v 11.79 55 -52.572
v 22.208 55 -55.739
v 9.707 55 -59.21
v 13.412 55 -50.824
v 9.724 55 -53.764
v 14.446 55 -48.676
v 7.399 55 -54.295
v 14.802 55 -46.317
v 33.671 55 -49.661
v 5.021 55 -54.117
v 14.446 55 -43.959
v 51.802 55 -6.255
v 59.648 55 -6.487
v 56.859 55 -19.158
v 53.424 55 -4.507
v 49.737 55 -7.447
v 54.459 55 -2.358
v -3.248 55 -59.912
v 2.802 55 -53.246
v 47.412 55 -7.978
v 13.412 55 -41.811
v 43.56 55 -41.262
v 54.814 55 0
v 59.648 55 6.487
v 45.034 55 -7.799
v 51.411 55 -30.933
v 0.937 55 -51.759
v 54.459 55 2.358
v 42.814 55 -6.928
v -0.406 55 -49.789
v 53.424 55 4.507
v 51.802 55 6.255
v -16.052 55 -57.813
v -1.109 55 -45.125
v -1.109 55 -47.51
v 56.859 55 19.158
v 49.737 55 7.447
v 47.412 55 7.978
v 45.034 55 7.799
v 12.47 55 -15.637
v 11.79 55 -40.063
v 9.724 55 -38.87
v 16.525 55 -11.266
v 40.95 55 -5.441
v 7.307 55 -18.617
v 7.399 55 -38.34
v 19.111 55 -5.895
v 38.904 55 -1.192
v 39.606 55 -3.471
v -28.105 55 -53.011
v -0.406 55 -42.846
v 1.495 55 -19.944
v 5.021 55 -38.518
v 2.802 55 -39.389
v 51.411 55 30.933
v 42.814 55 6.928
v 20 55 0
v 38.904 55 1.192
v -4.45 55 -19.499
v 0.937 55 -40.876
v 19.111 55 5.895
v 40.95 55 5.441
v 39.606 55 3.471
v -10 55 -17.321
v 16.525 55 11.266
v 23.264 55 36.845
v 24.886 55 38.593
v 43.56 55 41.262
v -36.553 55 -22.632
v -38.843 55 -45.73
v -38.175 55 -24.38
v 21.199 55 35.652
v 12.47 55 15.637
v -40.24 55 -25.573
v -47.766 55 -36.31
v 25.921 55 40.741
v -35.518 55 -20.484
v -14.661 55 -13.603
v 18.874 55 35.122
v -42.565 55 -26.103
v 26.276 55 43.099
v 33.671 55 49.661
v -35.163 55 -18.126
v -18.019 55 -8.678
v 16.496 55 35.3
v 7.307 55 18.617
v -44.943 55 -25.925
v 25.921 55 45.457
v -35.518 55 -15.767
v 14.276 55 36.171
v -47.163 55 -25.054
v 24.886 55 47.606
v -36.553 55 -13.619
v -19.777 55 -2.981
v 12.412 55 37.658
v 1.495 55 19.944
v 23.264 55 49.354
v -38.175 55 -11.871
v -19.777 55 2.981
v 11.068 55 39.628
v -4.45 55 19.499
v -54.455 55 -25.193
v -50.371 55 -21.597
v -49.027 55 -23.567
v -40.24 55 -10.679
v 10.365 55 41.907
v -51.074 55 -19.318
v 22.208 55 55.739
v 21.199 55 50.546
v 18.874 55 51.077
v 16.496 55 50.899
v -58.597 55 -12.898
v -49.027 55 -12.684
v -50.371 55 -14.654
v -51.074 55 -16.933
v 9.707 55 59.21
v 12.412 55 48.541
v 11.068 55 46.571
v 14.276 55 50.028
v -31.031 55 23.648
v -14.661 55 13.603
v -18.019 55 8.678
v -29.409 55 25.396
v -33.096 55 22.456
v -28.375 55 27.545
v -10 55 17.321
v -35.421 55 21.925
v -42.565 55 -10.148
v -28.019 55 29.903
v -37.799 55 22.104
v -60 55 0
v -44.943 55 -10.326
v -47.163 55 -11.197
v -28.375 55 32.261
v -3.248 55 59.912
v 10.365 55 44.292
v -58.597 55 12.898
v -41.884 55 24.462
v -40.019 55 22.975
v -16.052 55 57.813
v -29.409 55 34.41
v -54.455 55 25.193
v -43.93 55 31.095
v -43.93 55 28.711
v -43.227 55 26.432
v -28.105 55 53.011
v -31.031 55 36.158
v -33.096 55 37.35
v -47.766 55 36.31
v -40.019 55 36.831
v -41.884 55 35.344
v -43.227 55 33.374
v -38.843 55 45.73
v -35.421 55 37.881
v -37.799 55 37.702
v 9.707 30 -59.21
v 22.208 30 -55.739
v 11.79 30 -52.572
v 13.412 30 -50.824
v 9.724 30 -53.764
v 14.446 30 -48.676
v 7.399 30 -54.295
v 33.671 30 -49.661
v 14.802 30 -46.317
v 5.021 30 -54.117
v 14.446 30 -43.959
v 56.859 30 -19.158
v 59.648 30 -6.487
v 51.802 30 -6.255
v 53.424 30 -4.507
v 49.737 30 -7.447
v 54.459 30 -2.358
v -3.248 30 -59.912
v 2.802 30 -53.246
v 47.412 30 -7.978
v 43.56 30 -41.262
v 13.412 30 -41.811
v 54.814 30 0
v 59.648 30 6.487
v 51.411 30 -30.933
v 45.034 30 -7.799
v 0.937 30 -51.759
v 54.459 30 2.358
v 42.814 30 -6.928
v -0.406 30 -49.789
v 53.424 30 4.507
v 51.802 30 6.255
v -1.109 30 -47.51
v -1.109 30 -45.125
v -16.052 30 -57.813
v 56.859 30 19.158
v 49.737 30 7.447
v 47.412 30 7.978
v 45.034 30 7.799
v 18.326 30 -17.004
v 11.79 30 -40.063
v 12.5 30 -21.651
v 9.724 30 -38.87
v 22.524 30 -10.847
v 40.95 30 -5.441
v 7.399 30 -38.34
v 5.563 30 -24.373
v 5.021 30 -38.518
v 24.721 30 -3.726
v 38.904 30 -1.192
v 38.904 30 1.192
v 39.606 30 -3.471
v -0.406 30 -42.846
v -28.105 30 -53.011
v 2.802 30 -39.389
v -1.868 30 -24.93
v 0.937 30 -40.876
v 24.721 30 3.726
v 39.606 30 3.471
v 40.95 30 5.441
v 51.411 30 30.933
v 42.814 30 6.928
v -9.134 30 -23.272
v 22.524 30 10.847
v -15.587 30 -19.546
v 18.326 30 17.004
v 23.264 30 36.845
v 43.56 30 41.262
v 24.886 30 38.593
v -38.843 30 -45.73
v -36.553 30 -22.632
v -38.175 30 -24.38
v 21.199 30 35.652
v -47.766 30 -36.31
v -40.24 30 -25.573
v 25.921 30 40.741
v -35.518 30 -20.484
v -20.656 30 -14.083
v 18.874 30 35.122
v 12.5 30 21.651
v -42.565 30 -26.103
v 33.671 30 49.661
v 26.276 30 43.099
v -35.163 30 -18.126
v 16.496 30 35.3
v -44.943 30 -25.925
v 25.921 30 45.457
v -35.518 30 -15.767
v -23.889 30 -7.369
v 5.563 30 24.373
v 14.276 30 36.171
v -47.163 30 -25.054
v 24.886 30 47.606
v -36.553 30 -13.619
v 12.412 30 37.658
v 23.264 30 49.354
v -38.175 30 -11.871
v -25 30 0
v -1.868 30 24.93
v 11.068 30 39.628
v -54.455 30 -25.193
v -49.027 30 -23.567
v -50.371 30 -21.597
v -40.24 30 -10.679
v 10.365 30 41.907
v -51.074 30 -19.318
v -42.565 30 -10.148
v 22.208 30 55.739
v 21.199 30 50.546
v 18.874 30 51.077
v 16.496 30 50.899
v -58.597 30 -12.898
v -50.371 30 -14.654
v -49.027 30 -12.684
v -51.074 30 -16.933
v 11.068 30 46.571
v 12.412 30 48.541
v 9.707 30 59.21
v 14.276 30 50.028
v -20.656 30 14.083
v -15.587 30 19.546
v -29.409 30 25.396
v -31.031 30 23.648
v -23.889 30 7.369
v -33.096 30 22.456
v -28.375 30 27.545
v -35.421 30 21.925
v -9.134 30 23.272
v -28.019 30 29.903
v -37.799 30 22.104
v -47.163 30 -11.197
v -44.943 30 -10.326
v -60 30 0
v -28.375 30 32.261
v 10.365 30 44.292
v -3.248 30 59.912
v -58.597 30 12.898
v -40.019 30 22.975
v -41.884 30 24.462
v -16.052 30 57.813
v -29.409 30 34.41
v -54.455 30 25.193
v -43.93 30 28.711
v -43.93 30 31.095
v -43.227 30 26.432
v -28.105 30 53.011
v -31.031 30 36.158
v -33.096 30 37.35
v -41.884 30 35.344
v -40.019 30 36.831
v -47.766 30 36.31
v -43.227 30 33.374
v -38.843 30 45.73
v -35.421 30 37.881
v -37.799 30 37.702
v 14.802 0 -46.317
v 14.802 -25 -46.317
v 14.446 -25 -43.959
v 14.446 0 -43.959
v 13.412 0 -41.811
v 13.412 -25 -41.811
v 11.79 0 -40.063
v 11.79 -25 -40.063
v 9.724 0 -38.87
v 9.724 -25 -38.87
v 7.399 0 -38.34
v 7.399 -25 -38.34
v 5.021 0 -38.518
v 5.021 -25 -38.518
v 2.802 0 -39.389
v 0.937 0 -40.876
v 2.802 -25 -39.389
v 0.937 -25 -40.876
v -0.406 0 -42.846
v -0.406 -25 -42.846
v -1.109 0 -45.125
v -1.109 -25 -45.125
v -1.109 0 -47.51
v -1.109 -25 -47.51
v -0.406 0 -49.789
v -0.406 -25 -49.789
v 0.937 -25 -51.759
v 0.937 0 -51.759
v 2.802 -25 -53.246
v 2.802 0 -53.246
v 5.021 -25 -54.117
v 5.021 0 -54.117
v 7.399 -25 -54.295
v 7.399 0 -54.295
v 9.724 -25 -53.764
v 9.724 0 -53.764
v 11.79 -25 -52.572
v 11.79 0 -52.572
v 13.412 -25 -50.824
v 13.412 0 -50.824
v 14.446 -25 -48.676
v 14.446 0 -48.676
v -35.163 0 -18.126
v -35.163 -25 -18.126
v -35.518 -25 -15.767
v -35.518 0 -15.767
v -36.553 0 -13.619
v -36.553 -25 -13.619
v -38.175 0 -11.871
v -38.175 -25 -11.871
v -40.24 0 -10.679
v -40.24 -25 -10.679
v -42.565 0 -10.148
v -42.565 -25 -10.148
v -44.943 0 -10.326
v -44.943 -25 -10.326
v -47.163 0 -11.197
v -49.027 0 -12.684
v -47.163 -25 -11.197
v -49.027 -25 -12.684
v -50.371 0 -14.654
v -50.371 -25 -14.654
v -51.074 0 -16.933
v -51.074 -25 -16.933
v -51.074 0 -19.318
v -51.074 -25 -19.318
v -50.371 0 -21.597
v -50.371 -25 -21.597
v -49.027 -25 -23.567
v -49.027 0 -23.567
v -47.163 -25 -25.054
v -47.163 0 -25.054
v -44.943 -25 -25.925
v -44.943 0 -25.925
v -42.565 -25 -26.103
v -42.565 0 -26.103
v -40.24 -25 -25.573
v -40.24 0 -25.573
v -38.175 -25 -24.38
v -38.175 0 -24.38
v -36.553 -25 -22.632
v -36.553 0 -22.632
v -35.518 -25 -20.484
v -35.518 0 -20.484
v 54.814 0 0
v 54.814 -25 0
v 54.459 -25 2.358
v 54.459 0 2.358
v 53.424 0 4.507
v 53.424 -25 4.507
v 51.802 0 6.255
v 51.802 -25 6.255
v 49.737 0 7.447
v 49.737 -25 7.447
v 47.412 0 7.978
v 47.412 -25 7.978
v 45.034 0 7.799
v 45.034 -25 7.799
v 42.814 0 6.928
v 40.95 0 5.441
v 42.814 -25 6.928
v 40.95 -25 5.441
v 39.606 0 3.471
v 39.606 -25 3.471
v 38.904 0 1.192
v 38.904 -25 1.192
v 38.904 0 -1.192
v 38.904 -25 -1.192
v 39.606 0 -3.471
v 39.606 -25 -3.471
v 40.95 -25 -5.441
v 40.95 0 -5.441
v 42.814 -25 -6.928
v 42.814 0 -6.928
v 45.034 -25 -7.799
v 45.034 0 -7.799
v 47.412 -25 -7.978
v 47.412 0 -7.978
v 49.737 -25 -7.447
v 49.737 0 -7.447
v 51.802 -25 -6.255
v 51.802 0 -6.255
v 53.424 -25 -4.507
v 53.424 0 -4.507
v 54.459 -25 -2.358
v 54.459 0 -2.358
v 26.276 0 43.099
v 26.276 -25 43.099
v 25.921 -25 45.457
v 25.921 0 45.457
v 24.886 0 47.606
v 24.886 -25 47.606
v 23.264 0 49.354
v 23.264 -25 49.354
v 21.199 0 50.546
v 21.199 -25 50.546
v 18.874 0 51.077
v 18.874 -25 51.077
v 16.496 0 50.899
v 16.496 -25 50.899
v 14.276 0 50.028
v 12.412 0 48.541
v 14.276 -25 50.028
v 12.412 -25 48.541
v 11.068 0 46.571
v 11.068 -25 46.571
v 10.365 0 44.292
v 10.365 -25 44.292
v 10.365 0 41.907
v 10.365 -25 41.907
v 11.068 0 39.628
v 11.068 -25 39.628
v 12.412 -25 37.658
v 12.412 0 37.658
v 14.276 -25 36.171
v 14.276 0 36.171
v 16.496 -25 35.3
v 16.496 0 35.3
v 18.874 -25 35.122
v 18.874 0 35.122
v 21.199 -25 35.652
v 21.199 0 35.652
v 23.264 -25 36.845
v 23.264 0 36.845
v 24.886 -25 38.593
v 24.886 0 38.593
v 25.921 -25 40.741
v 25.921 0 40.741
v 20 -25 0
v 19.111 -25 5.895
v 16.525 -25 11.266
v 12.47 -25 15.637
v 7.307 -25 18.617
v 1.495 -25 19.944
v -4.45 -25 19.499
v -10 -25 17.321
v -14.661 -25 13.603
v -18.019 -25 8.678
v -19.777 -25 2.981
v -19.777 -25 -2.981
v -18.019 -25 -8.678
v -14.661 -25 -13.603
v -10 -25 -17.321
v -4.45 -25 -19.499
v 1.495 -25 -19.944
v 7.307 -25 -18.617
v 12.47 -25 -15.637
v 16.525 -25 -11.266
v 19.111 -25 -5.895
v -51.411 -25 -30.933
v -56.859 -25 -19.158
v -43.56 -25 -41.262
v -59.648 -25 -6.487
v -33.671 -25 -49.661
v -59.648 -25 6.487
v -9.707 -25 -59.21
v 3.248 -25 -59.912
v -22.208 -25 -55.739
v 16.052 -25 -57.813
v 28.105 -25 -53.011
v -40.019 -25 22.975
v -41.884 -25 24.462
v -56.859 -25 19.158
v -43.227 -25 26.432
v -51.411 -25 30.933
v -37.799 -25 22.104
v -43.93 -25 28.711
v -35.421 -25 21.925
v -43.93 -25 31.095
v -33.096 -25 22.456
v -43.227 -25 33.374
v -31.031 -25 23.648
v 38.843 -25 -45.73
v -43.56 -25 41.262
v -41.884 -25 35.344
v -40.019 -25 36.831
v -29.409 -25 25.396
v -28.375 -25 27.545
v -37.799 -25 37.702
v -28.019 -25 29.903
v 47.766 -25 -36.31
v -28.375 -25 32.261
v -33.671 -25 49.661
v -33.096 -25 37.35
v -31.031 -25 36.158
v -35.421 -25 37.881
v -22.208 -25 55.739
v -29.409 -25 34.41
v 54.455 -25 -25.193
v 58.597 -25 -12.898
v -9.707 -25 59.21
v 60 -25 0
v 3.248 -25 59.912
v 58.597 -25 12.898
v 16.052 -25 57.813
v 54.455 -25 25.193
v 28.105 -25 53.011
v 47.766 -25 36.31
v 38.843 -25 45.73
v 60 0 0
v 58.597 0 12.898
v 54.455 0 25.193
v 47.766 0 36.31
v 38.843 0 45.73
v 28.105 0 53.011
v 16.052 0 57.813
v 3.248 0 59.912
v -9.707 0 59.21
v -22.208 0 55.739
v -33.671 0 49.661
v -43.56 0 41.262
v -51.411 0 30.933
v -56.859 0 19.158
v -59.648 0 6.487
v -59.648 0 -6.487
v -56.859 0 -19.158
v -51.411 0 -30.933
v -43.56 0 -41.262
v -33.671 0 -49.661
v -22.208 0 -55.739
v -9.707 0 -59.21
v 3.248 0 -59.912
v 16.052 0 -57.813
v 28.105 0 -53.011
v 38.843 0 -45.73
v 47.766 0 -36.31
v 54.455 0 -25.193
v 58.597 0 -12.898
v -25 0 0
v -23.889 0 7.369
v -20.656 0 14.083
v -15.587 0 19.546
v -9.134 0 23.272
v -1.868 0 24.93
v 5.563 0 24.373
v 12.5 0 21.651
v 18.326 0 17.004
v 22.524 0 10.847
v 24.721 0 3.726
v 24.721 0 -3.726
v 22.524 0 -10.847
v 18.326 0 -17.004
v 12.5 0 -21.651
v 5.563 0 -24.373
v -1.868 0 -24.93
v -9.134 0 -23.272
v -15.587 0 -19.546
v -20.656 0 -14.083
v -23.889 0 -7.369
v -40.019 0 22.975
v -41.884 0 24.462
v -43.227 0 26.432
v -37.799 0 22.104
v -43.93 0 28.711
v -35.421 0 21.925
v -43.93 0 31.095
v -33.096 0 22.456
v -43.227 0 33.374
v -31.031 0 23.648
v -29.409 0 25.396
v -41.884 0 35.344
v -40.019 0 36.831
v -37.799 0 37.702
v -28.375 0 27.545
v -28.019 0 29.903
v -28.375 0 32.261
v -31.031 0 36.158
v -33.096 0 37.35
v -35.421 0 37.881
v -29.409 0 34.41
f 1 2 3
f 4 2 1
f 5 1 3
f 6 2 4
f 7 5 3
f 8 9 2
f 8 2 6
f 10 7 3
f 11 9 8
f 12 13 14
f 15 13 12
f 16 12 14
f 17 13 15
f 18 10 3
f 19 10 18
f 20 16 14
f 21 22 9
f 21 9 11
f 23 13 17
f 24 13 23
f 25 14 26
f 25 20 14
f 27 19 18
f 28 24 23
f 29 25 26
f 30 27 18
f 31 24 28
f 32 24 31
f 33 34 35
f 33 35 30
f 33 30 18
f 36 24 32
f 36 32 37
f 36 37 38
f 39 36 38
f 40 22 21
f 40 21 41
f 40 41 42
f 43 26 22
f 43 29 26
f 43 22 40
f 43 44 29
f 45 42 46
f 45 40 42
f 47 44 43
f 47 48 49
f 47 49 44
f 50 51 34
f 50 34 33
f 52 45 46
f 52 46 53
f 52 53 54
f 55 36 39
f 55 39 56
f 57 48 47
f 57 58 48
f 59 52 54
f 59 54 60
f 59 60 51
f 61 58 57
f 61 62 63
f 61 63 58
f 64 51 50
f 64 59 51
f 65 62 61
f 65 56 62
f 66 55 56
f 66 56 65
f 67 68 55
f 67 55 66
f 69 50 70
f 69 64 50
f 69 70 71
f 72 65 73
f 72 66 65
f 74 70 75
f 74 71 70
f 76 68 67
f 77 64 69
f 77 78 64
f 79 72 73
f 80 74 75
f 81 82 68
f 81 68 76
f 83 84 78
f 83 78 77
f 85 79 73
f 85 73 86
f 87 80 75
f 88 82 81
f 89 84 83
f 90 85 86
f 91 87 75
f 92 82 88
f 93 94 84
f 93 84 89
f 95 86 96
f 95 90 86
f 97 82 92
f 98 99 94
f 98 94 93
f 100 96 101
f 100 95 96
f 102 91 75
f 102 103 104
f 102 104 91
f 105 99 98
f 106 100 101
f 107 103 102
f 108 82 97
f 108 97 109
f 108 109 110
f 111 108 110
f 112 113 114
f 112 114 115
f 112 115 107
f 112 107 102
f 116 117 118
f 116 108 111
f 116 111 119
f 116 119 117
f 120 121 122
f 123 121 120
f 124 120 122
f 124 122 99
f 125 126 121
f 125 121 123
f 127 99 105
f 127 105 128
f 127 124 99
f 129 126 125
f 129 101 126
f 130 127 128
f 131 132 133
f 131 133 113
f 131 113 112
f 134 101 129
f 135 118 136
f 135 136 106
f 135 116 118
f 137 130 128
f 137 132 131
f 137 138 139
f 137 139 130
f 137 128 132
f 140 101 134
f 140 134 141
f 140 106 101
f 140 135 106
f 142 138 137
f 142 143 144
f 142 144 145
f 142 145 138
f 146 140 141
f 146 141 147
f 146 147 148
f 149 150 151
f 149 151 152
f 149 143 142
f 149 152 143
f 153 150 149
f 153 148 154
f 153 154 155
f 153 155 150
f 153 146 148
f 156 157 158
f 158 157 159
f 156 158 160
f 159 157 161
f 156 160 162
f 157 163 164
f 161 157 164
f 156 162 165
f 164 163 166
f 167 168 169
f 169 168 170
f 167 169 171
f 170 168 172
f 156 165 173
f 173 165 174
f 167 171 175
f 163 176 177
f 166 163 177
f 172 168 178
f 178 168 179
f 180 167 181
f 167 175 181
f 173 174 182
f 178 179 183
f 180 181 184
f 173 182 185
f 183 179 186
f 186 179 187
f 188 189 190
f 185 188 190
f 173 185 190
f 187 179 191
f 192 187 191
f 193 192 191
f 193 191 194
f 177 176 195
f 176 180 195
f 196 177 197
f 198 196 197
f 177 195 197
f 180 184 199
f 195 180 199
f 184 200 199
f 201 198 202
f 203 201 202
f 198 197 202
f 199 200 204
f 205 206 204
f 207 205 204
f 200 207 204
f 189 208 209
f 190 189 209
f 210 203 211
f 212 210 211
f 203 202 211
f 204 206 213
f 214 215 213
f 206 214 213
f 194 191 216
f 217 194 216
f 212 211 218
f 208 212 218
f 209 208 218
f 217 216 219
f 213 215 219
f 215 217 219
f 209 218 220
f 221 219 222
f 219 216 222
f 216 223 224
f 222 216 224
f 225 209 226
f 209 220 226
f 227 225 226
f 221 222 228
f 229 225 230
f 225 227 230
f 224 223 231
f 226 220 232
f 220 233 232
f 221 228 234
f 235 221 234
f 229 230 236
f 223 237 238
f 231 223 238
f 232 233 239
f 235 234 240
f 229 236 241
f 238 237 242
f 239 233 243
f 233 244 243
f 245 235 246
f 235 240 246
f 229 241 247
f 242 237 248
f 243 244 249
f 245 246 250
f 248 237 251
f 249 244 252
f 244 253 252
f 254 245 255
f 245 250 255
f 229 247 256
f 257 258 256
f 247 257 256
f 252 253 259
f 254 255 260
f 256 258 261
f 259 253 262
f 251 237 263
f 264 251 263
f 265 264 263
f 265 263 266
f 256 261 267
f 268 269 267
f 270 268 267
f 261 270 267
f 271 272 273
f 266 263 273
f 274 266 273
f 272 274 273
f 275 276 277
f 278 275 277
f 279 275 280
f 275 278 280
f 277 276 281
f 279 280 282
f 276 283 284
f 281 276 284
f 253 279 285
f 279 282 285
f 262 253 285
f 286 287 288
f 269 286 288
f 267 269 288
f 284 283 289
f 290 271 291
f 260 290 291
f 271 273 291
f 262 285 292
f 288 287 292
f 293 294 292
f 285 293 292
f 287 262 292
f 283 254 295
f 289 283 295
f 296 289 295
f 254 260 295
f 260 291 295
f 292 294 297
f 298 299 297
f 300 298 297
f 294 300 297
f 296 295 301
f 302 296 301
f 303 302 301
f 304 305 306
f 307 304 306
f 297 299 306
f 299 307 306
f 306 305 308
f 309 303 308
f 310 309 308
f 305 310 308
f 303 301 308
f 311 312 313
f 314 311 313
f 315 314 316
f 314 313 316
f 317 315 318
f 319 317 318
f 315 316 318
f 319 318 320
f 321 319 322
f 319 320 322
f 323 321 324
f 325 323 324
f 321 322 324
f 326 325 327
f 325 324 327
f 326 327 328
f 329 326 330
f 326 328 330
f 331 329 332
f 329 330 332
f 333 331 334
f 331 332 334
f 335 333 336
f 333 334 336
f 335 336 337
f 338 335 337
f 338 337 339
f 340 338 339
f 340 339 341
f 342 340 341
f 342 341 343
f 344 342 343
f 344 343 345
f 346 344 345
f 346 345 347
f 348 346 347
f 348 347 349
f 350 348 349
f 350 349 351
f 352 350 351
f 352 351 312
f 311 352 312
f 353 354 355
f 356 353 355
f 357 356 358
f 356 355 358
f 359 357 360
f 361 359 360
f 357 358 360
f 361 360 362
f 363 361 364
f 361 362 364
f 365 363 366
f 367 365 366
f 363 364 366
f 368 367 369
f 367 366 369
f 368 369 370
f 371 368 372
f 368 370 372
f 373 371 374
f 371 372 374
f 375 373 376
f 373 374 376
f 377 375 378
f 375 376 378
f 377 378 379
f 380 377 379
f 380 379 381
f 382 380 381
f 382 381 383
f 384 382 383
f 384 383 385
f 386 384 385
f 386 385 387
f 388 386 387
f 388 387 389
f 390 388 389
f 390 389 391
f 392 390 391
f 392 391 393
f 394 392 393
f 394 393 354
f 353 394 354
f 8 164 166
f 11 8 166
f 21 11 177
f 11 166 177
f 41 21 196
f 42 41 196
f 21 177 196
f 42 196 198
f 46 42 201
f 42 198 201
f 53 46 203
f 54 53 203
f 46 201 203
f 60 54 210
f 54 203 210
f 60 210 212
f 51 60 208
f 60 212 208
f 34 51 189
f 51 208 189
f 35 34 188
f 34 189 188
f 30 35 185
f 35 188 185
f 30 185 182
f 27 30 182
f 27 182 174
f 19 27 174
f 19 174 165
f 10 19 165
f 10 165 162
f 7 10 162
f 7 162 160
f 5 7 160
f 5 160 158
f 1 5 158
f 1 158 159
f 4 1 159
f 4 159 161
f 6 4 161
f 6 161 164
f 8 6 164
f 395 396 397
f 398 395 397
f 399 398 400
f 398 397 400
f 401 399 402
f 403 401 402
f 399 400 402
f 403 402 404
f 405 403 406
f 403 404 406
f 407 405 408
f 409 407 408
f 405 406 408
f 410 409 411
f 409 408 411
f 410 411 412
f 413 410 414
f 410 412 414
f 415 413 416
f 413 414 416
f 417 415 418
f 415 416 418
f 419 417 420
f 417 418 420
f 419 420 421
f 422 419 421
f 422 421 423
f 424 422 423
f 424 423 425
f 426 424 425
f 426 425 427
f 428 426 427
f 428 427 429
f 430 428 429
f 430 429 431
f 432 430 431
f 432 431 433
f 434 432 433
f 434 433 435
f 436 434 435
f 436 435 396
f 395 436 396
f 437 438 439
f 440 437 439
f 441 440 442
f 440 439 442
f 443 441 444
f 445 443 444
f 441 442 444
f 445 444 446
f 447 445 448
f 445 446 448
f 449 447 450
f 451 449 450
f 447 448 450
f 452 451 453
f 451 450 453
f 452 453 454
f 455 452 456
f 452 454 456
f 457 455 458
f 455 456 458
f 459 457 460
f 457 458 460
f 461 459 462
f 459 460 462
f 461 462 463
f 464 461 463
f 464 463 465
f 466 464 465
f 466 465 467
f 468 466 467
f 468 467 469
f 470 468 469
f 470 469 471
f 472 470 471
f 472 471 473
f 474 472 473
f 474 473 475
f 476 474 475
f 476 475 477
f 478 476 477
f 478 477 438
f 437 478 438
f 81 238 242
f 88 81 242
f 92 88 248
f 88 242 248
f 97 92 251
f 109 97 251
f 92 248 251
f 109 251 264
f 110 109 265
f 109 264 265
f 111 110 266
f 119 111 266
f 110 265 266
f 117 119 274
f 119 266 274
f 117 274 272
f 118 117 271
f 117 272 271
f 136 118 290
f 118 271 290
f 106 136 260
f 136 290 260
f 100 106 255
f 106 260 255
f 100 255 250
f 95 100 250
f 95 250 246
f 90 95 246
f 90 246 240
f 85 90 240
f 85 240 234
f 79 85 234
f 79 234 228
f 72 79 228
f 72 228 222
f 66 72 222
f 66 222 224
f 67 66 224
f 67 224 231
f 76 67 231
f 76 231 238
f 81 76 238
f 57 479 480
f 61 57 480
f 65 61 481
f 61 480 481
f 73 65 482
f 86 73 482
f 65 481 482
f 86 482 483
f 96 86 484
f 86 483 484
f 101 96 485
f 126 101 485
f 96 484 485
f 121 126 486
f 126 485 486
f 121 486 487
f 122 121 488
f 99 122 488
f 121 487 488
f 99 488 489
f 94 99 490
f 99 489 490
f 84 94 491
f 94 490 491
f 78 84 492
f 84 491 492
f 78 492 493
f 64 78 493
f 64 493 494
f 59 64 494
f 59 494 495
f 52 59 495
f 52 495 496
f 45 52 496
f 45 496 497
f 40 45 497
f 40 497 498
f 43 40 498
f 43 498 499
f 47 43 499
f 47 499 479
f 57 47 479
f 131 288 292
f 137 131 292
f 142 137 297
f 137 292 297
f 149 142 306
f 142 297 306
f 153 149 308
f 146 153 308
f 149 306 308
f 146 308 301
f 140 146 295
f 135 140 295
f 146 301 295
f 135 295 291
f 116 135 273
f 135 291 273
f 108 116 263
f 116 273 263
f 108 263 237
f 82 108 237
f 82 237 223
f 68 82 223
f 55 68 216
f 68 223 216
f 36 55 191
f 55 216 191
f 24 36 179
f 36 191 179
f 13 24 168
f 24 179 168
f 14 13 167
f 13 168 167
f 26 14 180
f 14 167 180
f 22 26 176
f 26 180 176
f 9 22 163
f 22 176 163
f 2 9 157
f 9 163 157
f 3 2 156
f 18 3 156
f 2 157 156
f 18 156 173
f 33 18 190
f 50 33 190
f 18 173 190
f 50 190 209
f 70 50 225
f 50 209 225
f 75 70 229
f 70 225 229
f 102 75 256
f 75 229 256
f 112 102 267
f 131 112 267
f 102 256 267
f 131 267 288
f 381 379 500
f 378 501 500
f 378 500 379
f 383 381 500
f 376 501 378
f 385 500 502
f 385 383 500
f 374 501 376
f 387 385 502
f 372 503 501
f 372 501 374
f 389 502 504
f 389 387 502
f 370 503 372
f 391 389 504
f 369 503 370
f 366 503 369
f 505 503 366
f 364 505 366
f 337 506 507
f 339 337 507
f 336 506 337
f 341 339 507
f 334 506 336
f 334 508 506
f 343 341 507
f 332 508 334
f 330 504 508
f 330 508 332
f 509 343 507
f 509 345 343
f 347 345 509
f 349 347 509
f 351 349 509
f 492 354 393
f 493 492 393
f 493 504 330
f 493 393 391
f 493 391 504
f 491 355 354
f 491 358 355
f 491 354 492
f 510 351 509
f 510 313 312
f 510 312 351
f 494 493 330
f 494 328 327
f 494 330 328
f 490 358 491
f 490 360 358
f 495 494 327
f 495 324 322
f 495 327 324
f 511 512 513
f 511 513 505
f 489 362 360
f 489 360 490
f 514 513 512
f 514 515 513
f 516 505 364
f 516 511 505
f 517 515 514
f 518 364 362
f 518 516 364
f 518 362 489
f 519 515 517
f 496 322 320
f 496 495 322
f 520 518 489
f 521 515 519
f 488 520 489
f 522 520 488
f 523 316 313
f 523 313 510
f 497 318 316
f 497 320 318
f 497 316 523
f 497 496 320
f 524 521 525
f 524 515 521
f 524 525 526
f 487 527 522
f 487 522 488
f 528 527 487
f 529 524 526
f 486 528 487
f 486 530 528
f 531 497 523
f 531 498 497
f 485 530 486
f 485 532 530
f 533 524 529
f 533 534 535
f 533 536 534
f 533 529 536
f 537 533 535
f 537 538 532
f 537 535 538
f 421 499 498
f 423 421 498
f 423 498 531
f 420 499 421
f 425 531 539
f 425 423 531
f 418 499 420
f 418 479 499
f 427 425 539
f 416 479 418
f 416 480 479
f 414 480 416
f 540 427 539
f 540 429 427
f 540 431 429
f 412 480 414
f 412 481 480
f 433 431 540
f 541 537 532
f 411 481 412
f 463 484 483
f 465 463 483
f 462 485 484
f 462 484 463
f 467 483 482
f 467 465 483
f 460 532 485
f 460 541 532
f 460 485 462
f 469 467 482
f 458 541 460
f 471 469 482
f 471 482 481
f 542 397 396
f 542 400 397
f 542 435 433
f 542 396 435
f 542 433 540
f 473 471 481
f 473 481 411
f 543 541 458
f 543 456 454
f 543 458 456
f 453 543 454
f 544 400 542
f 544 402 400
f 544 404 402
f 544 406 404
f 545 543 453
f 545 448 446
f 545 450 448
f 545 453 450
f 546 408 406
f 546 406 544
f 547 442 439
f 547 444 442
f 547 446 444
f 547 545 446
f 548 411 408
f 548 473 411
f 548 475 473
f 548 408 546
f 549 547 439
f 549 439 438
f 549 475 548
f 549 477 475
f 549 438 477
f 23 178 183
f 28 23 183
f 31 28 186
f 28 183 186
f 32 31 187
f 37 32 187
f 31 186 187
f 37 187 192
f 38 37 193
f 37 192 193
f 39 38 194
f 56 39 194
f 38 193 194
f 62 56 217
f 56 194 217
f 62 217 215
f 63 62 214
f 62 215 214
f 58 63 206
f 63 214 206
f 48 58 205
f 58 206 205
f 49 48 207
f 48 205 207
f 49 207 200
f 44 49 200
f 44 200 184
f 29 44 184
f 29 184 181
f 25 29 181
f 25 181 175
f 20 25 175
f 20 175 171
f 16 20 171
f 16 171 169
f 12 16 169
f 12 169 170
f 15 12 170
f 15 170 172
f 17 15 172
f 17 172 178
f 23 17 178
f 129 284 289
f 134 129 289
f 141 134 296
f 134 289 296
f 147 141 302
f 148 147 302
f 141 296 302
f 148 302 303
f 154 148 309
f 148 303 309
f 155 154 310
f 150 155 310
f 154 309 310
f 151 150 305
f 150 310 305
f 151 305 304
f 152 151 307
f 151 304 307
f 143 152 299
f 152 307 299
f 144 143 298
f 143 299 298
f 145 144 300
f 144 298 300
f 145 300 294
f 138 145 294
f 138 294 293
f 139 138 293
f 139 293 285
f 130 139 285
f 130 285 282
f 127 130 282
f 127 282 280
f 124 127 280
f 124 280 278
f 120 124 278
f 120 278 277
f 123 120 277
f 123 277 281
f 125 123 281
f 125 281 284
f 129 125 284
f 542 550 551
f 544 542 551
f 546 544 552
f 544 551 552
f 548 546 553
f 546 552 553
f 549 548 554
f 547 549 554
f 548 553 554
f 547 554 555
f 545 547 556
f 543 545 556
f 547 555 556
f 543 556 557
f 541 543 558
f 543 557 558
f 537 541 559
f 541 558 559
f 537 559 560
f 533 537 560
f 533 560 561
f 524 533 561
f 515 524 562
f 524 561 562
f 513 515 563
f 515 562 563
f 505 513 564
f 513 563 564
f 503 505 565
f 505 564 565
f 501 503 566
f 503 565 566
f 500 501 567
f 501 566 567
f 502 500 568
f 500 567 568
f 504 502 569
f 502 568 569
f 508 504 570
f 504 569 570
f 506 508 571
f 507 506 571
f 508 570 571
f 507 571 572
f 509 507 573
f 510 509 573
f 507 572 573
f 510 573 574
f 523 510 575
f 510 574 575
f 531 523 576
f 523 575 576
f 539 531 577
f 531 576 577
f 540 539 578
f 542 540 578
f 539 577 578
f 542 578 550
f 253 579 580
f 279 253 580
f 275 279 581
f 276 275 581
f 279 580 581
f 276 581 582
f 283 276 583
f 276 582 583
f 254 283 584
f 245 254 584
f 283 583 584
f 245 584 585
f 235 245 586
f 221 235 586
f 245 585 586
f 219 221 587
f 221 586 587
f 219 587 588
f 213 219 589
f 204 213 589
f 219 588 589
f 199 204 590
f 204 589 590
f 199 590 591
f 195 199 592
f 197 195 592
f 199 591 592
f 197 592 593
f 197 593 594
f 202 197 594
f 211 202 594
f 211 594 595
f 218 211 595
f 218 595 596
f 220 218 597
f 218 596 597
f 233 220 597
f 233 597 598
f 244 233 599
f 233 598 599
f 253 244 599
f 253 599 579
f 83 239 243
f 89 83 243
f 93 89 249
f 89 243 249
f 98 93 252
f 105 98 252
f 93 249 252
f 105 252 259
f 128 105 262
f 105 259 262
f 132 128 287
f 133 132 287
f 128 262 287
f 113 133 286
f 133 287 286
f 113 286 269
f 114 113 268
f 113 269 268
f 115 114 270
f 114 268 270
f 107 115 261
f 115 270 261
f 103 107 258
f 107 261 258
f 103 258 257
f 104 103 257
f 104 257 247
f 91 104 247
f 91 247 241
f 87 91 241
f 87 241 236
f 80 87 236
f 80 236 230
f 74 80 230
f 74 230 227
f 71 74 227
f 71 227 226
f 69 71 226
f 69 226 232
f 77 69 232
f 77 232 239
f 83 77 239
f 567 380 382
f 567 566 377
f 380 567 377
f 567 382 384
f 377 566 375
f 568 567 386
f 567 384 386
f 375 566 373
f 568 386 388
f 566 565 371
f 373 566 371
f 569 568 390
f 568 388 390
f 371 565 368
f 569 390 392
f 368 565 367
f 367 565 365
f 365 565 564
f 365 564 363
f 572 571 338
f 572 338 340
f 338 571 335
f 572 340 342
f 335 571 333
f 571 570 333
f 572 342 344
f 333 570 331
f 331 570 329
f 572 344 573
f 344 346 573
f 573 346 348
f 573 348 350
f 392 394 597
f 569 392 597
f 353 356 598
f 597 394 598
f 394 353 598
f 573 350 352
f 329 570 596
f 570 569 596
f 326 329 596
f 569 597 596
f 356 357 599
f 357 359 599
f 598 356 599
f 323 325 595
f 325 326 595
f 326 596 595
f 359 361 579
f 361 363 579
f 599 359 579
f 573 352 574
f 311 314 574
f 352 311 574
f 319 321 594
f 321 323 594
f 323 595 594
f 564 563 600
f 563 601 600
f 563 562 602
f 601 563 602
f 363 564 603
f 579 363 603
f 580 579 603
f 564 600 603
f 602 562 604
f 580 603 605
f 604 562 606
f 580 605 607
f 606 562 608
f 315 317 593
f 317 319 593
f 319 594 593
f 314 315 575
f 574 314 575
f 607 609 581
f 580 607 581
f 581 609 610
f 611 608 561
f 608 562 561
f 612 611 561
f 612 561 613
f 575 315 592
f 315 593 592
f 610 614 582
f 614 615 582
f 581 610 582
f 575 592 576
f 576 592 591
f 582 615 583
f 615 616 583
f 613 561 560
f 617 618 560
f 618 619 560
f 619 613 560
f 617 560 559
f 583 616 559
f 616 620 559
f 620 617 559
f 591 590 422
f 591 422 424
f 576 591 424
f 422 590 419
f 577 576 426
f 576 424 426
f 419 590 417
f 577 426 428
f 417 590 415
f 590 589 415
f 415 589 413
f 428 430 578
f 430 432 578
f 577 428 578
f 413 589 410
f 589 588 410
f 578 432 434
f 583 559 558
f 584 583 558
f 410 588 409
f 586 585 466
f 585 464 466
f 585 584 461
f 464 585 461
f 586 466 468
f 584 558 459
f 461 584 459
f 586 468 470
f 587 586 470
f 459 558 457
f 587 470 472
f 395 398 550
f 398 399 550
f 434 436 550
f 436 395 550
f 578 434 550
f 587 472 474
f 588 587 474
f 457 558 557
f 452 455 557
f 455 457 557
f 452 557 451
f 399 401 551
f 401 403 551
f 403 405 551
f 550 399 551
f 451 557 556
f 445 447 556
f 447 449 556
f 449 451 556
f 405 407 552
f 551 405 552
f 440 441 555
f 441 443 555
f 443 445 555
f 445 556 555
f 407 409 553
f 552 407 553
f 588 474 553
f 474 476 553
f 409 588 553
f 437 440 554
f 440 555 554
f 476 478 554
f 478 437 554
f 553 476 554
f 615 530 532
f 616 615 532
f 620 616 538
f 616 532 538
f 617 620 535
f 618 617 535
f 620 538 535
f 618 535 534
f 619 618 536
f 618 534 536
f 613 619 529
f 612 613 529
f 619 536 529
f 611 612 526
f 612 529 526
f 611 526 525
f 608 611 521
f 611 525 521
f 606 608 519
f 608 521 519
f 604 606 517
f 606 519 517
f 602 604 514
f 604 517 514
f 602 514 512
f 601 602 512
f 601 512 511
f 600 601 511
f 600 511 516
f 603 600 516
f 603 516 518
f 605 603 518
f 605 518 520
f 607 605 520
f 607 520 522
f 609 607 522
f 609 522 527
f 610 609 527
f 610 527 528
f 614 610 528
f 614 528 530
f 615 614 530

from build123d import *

# Parameters (mm, degrees)
F0_R     = 60
F1_DEPTH = 25
F2_R     = 25
F3_DEPTH = 30
F4_R     = 60
F5_DEPTH = 25
F6_R     = 20
F7_DEPTH = 80.001
F8_R     = 8
F9_DEPTH = 80.001


with BuildPart() as f1:
    # F0 (on Front) → F1 (new body)
    with BuildSketch(Plane.XZ):
        Circle(F0_R)
    extrude(amount=F1_DEPTH)

    # F2 (on face) → F3 (join)
    with BuildSketch(Plane(origin=(0, 0, 0), x_dir=(-1, 0, 0), z_dir=(0, 1, 0))):
        Circle(F2_R)
    extrude(amount=F3_DEPTH)

    # F4 (on face) → F5 (join)
    with BuildSketch(Plane(origin=(0, 30, 0), x_dir=(-1, 0, 0), z_dir=(0, 1, 0))):
        Circle(F4_R)
    extrude(amount=F5_DEPTH)

    # F6 (on face) → F7 (cut, through all)
    with BuildSketch(Plane.XZ.offset(25)):
        Circle(F6_R)
    extrude(amount=-F7_DEPTH, mode=Mode.SUBTRACT)

    # F8 (on face) → F9 (cut, through all)
    with BuildSketch(Plane.XZ.offset(25)):
        with Locations((-36.019197, 29.902987)):
            Circle(F8_R)
        with Locations((18.275928, 43.099439)):
            Circle(F8_R)
        with Locations((-43.162904, -18.125534)):
            Circle(F8_R)
        with Locations((46.81422, 0)):
            Circle(F8_R)
        with Locations((6.80161, -46.317484)):
            Circle(F8_R)
    extrude(amount=-F9_DEPTH, mode=Mode.SUBTRACT)


solid = f1.part
